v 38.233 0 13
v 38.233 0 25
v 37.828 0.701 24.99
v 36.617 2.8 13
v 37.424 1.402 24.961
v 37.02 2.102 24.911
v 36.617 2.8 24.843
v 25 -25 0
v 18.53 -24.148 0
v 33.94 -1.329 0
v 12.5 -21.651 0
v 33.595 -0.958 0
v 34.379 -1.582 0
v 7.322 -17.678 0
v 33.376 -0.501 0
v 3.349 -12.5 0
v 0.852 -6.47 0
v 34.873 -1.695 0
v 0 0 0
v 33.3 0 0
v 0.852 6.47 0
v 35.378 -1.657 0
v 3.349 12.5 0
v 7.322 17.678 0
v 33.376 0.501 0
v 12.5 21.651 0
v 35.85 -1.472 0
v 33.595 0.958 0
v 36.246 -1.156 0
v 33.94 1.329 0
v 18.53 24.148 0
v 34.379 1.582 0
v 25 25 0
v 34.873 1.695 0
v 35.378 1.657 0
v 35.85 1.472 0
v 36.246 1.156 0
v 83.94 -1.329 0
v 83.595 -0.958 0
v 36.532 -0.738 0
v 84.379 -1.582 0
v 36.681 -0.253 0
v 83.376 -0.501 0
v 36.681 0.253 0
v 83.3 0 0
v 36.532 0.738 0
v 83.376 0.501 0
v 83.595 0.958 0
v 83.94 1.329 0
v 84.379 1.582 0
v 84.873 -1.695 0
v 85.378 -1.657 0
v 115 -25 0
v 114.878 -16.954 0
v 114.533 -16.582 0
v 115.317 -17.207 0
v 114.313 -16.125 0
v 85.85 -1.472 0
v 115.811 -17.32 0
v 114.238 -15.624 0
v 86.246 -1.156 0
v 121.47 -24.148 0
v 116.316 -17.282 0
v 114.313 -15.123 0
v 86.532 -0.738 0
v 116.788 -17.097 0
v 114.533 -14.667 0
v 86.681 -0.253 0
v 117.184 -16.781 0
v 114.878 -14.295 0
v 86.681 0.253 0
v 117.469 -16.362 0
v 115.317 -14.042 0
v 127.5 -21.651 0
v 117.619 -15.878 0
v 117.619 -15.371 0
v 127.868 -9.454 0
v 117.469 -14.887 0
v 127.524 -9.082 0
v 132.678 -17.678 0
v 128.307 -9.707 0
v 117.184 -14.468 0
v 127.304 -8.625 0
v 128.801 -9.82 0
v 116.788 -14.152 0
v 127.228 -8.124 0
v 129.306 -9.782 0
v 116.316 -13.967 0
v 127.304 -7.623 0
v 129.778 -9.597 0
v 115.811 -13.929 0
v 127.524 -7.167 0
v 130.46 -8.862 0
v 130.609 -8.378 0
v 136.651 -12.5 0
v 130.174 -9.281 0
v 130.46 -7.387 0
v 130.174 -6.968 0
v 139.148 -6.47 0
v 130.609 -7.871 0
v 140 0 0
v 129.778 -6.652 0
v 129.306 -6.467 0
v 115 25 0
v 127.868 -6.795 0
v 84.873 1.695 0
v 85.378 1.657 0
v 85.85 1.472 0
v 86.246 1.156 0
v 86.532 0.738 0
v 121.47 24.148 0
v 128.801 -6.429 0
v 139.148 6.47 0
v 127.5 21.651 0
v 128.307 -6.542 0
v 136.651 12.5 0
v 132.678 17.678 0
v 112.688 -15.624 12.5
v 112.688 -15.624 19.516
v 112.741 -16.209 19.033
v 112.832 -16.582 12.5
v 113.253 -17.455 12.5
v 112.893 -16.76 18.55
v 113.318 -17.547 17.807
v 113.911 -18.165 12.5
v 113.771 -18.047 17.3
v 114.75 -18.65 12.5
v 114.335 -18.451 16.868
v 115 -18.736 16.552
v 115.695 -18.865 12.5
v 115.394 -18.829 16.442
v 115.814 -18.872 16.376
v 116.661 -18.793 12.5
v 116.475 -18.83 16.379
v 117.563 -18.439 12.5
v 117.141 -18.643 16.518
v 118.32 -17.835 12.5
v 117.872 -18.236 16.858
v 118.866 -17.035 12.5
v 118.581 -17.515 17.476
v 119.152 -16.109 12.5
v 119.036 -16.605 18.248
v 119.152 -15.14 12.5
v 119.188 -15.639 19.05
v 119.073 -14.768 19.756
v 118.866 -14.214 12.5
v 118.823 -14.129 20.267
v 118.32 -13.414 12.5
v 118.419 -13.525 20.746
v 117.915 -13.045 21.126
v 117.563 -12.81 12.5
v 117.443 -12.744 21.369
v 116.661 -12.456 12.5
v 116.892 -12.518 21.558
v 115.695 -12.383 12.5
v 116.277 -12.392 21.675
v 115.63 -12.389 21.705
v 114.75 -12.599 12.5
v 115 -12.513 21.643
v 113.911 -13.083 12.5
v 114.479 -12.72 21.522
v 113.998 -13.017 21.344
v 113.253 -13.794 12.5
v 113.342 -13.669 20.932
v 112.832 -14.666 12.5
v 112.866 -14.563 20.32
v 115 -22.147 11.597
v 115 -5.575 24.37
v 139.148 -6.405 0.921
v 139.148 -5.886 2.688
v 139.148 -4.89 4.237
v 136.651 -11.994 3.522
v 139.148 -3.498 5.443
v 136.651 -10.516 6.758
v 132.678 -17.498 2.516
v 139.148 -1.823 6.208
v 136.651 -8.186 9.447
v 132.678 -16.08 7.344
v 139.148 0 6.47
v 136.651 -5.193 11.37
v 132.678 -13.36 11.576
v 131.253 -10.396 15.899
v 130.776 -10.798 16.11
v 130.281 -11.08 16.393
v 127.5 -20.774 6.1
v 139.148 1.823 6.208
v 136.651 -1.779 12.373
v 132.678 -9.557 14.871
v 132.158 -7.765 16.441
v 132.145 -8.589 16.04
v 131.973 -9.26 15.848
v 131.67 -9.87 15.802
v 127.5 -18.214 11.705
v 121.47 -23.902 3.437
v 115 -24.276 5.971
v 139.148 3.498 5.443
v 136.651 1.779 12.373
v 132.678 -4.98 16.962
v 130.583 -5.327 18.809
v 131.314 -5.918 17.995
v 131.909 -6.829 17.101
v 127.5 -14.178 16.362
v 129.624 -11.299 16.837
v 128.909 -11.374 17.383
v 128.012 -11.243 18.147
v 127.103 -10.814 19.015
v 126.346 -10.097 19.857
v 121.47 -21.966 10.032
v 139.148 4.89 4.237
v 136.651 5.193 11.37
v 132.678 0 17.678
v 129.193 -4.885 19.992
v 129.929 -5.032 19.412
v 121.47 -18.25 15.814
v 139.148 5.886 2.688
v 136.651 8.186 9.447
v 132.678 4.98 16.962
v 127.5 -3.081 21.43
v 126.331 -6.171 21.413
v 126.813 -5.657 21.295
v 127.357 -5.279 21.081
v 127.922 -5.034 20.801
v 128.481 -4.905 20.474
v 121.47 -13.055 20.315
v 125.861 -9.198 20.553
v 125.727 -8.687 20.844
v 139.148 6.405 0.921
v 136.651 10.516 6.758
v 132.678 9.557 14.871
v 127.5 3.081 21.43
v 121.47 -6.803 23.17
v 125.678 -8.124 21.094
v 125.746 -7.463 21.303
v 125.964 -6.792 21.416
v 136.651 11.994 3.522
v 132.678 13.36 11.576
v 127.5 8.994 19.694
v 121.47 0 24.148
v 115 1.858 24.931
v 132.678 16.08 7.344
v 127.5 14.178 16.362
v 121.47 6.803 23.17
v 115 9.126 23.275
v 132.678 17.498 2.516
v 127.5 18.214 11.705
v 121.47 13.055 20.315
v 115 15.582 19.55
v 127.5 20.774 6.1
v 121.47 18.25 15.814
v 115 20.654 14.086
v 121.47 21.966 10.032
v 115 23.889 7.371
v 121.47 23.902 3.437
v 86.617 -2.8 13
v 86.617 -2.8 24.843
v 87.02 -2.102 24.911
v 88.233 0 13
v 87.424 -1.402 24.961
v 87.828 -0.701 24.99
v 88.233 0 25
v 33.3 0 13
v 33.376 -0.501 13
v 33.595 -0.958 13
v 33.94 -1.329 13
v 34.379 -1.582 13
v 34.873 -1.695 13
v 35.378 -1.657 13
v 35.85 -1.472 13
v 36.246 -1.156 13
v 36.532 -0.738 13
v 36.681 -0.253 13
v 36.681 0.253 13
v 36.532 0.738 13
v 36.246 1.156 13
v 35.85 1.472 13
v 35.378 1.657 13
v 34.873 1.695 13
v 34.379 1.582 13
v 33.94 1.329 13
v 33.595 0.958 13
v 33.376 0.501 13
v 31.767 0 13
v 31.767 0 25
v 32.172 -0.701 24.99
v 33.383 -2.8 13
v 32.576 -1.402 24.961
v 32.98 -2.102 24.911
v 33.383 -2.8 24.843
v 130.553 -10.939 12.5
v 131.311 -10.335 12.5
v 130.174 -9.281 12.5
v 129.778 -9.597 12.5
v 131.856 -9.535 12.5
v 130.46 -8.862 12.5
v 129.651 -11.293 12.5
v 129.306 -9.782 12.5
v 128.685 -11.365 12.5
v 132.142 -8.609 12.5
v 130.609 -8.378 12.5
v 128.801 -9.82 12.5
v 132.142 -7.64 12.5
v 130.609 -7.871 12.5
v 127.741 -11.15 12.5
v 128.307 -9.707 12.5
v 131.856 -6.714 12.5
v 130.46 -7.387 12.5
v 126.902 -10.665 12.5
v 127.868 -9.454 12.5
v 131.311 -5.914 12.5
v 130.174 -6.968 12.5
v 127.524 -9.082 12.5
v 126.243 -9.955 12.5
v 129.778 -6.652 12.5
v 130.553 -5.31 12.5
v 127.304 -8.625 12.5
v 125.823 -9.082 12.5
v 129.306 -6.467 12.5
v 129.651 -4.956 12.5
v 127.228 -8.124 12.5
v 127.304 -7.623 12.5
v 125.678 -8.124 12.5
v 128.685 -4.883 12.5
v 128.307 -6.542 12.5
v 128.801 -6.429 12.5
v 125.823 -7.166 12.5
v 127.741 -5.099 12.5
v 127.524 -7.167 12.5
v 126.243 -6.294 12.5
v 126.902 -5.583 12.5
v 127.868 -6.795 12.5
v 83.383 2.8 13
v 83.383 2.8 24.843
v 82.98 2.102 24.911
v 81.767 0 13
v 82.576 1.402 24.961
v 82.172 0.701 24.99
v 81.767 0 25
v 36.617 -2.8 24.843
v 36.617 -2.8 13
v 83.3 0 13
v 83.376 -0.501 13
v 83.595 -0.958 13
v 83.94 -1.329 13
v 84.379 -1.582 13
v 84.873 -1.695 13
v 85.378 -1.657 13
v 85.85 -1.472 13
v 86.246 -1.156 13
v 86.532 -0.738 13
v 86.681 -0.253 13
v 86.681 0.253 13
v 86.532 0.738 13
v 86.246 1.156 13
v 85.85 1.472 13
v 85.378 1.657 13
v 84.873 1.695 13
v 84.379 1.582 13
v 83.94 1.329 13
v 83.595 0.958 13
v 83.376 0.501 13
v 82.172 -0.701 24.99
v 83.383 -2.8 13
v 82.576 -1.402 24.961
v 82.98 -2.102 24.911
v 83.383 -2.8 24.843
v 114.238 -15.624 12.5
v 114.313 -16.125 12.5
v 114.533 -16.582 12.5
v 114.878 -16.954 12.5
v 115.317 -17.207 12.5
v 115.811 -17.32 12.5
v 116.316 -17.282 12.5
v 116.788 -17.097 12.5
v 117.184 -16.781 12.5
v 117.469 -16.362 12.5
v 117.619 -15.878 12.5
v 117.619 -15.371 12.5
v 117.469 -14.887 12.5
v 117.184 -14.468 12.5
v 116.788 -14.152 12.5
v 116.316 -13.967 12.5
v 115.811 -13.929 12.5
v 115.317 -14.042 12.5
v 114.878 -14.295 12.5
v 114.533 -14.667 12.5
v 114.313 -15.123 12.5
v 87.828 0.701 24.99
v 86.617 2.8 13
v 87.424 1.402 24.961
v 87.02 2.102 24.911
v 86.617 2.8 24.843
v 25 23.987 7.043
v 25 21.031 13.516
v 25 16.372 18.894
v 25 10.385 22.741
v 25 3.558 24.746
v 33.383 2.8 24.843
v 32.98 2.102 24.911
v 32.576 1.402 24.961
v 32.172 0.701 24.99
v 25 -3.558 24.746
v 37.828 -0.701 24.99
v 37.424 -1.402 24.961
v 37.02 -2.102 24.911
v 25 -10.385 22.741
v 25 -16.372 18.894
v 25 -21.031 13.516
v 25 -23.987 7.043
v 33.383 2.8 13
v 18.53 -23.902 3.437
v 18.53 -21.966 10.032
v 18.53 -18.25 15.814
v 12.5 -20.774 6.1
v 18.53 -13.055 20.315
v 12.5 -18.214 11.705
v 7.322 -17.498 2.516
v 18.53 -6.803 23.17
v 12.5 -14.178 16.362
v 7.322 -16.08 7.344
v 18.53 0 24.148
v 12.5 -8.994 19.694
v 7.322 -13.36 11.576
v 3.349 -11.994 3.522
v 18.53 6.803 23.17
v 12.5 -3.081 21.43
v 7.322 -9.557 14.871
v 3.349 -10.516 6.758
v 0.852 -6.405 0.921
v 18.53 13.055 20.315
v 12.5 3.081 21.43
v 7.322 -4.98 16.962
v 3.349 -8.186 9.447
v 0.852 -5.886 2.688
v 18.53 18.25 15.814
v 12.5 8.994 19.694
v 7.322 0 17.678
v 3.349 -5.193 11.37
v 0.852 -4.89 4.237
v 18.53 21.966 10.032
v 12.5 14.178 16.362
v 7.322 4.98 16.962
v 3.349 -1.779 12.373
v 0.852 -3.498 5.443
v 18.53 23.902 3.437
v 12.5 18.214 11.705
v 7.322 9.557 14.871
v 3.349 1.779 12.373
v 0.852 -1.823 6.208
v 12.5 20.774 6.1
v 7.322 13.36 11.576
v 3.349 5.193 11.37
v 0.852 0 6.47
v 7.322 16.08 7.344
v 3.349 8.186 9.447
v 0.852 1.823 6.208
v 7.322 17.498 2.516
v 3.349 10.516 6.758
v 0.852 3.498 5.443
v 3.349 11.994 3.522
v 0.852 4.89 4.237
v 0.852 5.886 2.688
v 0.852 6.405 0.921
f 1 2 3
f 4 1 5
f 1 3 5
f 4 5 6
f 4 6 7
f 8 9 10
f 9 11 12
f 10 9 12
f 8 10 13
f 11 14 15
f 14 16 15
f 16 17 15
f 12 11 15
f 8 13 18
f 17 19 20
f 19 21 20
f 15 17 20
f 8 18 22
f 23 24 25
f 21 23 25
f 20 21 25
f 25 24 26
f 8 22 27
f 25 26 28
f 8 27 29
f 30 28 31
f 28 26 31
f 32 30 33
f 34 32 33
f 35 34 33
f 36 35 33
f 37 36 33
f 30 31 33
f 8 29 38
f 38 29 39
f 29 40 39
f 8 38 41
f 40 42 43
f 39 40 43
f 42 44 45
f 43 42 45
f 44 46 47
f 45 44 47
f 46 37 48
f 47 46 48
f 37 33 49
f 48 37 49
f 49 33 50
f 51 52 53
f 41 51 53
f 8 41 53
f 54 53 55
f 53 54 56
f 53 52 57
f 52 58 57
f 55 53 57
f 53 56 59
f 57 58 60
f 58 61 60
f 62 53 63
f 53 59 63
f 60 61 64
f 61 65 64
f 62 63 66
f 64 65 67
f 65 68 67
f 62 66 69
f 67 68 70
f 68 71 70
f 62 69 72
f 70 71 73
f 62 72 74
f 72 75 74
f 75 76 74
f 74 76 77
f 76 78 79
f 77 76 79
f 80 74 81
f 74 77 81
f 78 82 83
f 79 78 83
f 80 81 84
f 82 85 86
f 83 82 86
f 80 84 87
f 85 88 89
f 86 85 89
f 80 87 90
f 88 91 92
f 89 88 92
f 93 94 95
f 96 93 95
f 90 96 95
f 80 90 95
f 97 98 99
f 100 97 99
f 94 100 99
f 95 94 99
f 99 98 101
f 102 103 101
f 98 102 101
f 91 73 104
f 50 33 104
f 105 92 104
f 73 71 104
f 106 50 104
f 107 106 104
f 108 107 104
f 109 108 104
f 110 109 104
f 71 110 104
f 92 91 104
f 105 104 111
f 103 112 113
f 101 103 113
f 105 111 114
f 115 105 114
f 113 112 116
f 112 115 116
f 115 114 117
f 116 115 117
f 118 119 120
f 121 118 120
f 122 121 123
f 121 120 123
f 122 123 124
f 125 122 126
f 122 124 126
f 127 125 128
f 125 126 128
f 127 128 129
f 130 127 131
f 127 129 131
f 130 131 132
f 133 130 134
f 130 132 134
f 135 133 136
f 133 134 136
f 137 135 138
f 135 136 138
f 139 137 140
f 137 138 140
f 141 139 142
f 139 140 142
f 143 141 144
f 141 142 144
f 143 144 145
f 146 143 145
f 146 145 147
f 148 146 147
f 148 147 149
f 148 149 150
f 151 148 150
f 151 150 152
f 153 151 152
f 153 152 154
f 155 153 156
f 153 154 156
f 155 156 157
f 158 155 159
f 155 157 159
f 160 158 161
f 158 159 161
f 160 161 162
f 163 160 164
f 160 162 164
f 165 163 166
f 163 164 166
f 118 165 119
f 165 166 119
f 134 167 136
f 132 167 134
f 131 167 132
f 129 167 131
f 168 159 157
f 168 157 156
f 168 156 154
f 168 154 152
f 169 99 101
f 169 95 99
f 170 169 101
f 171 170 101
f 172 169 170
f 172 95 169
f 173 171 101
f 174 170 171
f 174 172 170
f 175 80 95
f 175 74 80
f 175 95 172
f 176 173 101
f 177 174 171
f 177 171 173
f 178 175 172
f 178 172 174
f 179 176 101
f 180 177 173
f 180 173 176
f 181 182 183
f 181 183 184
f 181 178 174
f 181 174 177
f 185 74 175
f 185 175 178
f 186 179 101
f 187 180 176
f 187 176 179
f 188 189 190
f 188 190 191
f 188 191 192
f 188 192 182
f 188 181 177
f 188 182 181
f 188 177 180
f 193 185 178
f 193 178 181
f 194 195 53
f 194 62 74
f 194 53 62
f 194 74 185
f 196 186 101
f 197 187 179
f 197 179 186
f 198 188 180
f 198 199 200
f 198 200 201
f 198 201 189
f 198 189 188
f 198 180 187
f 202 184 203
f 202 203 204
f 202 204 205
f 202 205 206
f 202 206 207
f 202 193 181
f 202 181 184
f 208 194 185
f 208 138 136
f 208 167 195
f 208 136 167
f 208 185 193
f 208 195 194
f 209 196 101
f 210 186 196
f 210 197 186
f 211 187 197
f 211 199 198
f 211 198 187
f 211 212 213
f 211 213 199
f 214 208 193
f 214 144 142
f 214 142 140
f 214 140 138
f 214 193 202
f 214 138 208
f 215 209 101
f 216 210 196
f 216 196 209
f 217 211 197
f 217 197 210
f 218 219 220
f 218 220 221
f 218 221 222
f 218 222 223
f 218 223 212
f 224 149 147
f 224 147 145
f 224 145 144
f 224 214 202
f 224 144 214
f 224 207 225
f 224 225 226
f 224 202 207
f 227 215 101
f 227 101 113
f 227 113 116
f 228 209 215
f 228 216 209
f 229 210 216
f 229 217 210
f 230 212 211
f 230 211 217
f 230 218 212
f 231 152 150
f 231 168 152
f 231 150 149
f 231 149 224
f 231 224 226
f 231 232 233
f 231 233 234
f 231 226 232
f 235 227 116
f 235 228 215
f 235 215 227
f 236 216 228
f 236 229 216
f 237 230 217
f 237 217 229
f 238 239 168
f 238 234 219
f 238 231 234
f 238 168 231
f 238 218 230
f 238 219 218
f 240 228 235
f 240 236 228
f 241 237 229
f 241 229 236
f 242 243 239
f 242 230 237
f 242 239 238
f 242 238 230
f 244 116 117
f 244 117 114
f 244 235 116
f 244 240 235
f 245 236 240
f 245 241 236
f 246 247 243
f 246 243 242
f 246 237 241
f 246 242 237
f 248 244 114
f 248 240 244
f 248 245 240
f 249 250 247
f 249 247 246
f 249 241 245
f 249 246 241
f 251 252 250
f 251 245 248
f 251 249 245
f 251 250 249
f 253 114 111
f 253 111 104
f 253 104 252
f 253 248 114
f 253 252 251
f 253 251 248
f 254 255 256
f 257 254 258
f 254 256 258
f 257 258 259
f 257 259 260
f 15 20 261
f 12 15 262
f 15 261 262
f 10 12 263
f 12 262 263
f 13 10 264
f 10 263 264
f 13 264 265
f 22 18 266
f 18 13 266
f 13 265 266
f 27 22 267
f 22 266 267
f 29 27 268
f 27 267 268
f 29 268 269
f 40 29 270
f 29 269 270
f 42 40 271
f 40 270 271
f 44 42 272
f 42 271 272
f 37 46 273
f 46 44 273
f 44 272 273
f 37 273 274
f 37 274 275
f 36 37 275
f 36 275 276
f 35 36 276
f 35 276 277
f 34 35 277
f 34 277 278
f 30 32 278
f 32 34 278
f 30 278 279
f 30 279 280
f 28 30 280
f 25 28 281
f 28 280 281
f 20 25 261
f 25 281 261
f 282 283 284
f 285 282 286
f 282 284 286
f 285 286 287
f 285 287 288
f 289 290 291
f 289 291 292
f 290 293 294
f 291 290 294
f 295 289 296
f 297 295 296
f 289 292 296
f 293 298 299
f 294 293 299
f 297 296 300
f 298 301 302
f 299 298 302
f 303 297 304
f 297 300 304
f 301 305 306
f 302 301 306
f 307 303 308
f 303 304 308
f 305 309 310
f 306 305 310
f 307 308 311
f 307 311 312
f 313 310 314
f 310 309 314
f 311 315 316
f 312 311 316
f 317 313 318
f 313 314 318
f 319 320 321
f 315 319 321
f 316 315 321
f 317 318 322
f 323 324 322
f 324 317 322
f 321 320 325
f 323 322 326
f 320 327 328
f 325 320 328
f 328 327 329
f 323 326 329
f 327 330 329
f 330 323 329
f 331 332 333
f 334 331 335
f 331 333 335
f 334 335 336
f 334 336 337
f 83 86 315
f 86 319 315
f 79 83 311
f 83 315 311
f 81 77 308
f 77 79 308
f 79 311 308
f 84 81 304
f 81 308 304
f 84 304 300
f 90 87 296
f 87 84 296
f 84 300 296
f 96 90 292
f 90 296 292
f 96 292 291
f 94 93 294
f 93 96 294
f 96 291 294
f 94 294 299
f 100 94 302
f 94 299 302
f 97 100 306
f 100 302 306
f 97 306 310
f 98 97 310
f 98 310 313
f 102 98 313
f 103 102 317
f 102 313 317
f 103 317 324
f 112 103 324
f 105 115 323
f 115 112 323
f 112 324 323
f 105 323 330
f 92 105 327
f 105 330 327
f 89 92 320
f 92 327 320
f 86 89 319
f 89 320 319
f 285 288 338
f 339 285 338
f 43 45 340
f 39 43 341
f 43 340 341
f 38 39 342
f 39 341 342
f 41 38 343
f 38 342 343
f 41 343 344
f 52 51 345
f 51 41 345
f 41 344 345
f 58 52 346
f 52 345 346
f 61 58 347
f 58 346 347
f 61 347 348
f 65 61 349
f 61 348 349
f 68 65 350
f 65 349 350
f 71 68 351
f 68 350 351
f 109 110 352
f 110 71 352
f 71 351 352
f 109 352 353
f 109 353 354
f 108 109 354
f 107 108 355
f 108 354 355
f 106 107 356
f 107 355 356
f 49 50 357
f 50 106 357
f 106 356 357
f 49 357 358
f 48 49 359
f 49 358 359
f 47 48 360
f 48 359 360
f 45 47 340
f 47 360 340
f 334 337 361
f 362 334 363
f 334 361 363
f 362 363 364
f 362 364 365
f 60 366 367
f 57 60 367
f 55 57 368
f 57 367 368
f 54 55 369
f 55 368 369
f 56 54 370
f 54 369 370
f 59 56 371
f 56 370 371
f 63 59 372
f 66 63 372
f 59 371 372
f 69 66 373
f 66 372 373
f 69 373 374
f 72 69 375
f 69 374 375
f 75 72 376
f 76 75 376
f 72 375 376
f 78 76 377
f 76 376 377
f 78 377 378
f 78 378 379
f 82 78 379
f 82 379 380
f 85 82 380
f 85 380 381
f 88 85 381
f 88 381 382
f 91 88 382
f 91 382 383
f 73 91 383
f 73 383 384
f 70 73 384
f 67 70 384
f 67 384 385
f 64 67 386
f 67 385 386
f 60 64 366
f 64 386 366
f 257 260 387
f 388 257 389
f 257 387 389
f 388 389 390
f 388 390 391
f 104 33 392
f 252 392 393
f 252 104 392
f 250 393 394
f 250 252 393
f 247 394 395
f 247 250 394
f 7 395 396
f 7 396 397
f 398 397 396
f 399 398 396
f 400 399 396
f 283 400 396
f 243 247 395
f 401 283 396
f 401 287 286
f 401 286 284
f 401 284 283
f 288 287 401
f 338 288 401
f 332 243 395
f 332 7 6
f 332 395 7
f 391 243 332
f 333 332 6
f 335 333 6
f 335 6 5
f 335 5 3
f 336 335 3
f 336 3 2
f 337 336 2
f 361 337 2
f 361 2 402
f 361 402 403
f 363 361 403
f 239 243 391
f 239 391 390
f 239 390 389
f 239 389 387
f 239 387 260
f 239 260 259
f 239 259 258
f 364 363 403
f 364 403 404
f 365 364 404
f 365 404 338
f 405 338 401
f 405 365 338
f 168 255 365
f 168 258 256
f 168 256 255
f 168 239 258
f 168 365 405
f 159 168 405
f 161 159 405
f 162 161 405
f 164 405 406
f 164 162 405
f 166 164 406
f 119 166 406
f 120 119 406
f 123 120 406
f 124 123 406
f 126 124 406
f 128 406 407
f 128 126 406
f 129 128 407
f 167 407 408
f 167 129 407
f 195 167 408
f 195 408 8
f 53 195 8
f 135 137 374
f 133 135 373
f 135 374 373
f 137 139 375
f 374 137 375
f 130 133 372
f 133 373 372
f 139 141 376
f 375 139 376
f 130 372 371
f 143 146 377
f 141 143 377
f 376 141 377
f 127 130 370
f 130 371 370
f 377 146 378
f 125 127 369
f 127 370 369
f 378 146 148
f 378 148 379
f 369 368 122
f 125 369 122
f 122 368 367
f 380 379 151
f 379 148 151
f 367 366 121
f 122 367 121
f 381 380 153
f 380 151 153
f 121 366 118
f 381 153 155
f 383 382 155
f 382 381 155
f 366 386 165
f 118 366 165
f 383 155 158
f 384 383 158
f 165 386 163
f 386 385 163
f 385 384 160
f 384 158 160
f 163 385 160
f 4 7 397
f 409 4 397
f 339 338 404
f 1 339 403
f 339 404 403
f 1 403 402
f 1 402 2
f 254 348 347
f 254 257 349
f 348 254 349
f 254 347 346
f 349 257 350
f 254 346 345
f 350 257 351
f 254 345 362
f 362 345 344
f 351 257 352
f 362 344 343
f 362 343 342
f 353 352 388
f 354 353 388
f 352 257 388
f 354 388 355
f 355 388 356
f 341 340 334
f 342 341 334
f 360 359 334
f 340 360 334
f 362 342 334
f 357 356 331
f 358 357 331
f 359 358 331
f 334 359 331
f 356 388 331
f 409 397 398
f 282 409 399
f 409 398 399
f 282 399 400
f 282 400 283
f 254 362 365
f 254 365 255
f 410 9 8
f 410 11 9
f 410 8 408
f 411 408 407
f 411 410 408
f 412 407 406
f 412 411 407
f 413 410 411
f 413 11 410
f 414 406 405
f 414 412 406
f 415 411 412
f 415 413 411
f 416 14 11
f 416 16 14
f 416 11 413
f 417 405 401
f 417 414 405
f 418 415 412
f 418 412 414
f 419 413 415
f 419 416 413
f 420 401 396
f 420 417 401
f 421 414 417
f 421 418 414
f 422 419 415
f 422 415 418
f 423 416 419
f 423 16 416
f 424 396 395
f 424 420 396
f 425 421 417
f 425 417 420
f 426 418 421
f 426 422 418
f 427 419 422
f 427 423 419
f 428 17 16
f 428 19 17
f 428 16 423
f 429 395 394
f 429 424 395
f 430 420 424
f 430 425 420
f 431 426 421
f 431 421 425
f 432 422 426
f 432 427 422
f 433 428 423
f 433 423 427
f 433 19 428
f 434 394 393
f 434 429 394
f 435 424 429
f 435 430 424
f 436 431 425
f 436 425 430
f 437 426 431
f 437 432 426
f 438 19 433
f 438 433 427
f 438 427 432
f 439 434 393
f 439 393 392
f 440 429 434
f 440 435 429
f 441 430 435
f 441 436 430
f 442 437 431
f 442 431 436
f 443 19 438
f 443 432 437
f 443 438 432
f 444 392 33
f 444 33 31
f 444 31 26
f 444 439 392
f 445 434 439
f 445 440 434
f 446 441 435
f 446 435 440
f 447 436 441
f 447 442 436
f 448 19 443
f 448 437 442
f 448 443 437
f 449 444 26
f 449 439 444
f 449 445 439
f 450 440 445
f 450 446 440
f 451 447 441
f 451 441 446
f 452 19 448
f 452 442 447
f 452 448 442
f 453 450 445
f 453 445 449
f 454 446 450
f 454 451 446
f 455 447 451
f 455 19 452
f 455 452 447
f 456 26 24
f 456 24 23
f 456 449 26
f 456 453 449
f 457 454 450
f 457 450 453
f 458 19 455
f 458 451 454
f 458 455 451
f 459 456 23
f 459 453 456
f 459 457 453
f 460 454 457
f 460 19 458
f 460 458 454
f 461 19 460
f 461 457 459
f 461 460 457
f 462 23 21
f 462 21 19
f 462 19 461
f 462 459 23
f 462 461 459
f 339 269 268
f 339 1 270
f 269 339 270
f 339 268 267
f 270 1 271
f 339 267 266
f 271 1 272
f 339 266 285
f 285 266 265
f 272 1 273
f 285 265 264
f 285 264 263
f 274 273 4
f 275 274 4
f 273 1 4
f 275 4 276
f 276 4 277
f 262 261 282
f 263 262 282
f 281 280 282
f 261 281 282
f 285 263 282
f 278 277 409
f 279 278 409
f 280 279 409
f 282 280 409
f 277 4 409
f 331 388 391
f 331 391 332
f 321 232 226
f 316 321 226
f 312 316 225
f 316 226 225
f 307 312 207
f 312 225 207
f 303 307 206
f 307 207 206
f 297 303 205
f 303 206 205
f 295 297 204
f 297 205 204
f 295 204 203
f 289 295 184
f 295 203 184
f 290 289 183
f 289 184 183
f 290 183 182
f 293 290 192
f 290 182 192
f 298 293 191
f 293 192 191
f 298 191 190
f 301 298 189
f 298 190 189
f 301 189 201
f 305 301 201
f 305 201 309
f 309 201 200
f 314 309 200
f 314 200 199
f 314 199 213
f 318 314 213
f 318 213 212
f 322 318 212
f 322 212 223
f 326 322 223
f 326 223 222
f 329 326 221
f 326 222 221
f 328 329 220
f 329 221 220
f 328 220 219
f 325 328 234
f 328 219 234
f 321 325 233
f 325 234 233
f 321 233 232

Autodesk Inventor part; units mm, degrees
ref_plane "Plan YZ" through (0, 0, 0) normal (1, 0, 0) x (0, 1, 0)
ref_plane "Plan XZ" through (0, 0, 0) normal (0, 1, 0) x (-1, 0, 0)
sketch "Esquisse1" plane through (0, 0, 0) normal (0, 0, 1) x (1, 0, 0)
  arc A0 (25, 25) -> (0, 0) centre (25, 0) ccw
  line L0 (25, 25) -> (115, 25)
  arc A1 (140, 0) -> (115, 25) centre (115, 0) ccw
  line L1 (0, 0) -> (140, 0)
  dimension "d0" = 90
  dimension "d1" = 25
revolve "Révolution1" add sketch "Esquisse1" angle 180 about axis through (0, 0, 0) along (1, 0, 0)
ref_plane "Plan de construction1" through (115, 25, 25) normal (0, 0, -1) x (-1, 0, 0)
sketch "Esquisse6" plane through (115, 25, 25) normal (0, 0, -1) x (-1, 0, 0)
  line L0 (76.7668, -25) -> (78.3834, -22.2)
  line L1 (78.3834, -22.2) -> (81.6166, -22.2)
  line L2 (81.6166, -22.2) -> (83.2332, -25)
  line L3 (83.2332, -25) -> (81.6166, -27.8)
  line L4 (81.6166, -27.8) -> (78.3834, -27.8)
  line L5 (78.3834, -27.8) -> (76.7668, -25)
  line L6 (90, 0) -> (90, -50) projected
  line L7 (26.7668, -25) -> (28.3834, -22.2)
  line L8 (28.3834, -22.2) -> (31.6166, -22.2)
  line L9 (31.6166, -22.2) -> (33.2332, -25)
  line L10 (33.2332, -25) -> (31.6166, -27.8)
  line L11 (31.6166, -27.8) -> (28.3834, -27.8)
  line L12 (28.3834, -27.8) -> (26.7668, -25)
  line L13 (30, -25) -> (26.7668, -25) construction
  line L14 (90, -25) -> (19.1163, -25) construction
  line L15 (80, -25) -> (76.7668, -25) construction
  point P0 (115, -25)
  dimension "d4" = 5.6
  dimension "d5" = 10
  dimension "d6" = 50
  dimension "d7" = 5.6
extrude "Extrusion1" cut sketch "Esquisse6" along normal blind 12
sketch "Esquisse7" plane through (115, 25, 25) normal (0, 0, -1) x (-1, 0, 0)
  circle A0 centre (80, -25) radius 3.2332 construction
  circle A1 centre (30, -25) radius 3.2332 construction
  circle A2 centre (80, -25) radius 1.7
  circle A3 centre (30, -25) radius 1.7
  point P0 (115, -25)
  point P1 (78.3834, -22.2)
  point P2 (28.3834, -22.2)
  point P3 (31.6166, -27.8)
  point P4 (28.3834, -27.8)
  point P5 (81.6166, -27.8)
  point P6 (78.3834, -27.8)
  dimension "d10" = 3.4
  dimension "d11" = 3.4
extrude "Extrusion2" cut sketch "Esquisse7" along normal blind 25
sketch "Esquisse8" plane through (115, 25, 25) normal (0, 0, -1) x (-1, 0, 0)
  line L0 (-0.0645, -24.9628) -> (-43.3013, 0) construction
  line L1 (-43.3013, 0) -> (-55.8013, -21.6506) construction
  line L2 (-55.8013, -21.6506) -> (9.1506, -59.1506) construction
  line L3 (9.1506, -59.1506) -> (21.6506, -37.5) construction
  line L4 (21.6506, -37.5) -> (-0.0645, -24.9628) construction
  arc A0 (0, 0) -> (0, -50) centre (0, -25) ccw projected
  line L5 (0, 0) -> (0, -50) projected
  line L6 (90, 0) -> (0, 0) projected
  line L7 (-13.9282, -33.1244) -> (-0.9378, -40.6244) construction
  circle A1 centre (-13.9282, -33.1244) radius 1.7
  circle A2 centre (-0.9378, -40.6244) radius 1.7
  point P0 (115, -25)
  dimension "d14" = 300
  dimension "d15" = 14
  dimension "d16" = 18
  dimension "d17" = 33
  dimension "d18" = 3.4
  dimension "d19" = 3.4
extrude "Extrusion3" cut sketch "Esquisse8" along normal blind 25 contours A2 L5 | L5 A2 | A1
sketch "Esquisse9" plane through (115, 25, 25) normal (0, 0, -1) x (-1, 0, 0)
  circle A0 centre (-13.9282, -33.1244) radius 3.25
  circle A1 centre (-0.9378, -40.6244) radius 3.25
  circle A2 centre (-13.9282, -33.1244) radius 1.7 projected
  circle A3 centre (-0.9378, -40.6244) radius 1.7 projected
  point P0 (115, -25)
  dimension "d22" = 6.5
  dimension "d23" = 6.5
extrude "Extrusion4" cut sketch "Esquisse9" along normal blind 12.5
equation "\"d7\" = d4"
equation "\"d11\" = d10"
equation "\"d19\" = d18"
equation "\"d23\" = d22"
properties part number "P1704_005_mainGaucheExterieur" material "PLA"
